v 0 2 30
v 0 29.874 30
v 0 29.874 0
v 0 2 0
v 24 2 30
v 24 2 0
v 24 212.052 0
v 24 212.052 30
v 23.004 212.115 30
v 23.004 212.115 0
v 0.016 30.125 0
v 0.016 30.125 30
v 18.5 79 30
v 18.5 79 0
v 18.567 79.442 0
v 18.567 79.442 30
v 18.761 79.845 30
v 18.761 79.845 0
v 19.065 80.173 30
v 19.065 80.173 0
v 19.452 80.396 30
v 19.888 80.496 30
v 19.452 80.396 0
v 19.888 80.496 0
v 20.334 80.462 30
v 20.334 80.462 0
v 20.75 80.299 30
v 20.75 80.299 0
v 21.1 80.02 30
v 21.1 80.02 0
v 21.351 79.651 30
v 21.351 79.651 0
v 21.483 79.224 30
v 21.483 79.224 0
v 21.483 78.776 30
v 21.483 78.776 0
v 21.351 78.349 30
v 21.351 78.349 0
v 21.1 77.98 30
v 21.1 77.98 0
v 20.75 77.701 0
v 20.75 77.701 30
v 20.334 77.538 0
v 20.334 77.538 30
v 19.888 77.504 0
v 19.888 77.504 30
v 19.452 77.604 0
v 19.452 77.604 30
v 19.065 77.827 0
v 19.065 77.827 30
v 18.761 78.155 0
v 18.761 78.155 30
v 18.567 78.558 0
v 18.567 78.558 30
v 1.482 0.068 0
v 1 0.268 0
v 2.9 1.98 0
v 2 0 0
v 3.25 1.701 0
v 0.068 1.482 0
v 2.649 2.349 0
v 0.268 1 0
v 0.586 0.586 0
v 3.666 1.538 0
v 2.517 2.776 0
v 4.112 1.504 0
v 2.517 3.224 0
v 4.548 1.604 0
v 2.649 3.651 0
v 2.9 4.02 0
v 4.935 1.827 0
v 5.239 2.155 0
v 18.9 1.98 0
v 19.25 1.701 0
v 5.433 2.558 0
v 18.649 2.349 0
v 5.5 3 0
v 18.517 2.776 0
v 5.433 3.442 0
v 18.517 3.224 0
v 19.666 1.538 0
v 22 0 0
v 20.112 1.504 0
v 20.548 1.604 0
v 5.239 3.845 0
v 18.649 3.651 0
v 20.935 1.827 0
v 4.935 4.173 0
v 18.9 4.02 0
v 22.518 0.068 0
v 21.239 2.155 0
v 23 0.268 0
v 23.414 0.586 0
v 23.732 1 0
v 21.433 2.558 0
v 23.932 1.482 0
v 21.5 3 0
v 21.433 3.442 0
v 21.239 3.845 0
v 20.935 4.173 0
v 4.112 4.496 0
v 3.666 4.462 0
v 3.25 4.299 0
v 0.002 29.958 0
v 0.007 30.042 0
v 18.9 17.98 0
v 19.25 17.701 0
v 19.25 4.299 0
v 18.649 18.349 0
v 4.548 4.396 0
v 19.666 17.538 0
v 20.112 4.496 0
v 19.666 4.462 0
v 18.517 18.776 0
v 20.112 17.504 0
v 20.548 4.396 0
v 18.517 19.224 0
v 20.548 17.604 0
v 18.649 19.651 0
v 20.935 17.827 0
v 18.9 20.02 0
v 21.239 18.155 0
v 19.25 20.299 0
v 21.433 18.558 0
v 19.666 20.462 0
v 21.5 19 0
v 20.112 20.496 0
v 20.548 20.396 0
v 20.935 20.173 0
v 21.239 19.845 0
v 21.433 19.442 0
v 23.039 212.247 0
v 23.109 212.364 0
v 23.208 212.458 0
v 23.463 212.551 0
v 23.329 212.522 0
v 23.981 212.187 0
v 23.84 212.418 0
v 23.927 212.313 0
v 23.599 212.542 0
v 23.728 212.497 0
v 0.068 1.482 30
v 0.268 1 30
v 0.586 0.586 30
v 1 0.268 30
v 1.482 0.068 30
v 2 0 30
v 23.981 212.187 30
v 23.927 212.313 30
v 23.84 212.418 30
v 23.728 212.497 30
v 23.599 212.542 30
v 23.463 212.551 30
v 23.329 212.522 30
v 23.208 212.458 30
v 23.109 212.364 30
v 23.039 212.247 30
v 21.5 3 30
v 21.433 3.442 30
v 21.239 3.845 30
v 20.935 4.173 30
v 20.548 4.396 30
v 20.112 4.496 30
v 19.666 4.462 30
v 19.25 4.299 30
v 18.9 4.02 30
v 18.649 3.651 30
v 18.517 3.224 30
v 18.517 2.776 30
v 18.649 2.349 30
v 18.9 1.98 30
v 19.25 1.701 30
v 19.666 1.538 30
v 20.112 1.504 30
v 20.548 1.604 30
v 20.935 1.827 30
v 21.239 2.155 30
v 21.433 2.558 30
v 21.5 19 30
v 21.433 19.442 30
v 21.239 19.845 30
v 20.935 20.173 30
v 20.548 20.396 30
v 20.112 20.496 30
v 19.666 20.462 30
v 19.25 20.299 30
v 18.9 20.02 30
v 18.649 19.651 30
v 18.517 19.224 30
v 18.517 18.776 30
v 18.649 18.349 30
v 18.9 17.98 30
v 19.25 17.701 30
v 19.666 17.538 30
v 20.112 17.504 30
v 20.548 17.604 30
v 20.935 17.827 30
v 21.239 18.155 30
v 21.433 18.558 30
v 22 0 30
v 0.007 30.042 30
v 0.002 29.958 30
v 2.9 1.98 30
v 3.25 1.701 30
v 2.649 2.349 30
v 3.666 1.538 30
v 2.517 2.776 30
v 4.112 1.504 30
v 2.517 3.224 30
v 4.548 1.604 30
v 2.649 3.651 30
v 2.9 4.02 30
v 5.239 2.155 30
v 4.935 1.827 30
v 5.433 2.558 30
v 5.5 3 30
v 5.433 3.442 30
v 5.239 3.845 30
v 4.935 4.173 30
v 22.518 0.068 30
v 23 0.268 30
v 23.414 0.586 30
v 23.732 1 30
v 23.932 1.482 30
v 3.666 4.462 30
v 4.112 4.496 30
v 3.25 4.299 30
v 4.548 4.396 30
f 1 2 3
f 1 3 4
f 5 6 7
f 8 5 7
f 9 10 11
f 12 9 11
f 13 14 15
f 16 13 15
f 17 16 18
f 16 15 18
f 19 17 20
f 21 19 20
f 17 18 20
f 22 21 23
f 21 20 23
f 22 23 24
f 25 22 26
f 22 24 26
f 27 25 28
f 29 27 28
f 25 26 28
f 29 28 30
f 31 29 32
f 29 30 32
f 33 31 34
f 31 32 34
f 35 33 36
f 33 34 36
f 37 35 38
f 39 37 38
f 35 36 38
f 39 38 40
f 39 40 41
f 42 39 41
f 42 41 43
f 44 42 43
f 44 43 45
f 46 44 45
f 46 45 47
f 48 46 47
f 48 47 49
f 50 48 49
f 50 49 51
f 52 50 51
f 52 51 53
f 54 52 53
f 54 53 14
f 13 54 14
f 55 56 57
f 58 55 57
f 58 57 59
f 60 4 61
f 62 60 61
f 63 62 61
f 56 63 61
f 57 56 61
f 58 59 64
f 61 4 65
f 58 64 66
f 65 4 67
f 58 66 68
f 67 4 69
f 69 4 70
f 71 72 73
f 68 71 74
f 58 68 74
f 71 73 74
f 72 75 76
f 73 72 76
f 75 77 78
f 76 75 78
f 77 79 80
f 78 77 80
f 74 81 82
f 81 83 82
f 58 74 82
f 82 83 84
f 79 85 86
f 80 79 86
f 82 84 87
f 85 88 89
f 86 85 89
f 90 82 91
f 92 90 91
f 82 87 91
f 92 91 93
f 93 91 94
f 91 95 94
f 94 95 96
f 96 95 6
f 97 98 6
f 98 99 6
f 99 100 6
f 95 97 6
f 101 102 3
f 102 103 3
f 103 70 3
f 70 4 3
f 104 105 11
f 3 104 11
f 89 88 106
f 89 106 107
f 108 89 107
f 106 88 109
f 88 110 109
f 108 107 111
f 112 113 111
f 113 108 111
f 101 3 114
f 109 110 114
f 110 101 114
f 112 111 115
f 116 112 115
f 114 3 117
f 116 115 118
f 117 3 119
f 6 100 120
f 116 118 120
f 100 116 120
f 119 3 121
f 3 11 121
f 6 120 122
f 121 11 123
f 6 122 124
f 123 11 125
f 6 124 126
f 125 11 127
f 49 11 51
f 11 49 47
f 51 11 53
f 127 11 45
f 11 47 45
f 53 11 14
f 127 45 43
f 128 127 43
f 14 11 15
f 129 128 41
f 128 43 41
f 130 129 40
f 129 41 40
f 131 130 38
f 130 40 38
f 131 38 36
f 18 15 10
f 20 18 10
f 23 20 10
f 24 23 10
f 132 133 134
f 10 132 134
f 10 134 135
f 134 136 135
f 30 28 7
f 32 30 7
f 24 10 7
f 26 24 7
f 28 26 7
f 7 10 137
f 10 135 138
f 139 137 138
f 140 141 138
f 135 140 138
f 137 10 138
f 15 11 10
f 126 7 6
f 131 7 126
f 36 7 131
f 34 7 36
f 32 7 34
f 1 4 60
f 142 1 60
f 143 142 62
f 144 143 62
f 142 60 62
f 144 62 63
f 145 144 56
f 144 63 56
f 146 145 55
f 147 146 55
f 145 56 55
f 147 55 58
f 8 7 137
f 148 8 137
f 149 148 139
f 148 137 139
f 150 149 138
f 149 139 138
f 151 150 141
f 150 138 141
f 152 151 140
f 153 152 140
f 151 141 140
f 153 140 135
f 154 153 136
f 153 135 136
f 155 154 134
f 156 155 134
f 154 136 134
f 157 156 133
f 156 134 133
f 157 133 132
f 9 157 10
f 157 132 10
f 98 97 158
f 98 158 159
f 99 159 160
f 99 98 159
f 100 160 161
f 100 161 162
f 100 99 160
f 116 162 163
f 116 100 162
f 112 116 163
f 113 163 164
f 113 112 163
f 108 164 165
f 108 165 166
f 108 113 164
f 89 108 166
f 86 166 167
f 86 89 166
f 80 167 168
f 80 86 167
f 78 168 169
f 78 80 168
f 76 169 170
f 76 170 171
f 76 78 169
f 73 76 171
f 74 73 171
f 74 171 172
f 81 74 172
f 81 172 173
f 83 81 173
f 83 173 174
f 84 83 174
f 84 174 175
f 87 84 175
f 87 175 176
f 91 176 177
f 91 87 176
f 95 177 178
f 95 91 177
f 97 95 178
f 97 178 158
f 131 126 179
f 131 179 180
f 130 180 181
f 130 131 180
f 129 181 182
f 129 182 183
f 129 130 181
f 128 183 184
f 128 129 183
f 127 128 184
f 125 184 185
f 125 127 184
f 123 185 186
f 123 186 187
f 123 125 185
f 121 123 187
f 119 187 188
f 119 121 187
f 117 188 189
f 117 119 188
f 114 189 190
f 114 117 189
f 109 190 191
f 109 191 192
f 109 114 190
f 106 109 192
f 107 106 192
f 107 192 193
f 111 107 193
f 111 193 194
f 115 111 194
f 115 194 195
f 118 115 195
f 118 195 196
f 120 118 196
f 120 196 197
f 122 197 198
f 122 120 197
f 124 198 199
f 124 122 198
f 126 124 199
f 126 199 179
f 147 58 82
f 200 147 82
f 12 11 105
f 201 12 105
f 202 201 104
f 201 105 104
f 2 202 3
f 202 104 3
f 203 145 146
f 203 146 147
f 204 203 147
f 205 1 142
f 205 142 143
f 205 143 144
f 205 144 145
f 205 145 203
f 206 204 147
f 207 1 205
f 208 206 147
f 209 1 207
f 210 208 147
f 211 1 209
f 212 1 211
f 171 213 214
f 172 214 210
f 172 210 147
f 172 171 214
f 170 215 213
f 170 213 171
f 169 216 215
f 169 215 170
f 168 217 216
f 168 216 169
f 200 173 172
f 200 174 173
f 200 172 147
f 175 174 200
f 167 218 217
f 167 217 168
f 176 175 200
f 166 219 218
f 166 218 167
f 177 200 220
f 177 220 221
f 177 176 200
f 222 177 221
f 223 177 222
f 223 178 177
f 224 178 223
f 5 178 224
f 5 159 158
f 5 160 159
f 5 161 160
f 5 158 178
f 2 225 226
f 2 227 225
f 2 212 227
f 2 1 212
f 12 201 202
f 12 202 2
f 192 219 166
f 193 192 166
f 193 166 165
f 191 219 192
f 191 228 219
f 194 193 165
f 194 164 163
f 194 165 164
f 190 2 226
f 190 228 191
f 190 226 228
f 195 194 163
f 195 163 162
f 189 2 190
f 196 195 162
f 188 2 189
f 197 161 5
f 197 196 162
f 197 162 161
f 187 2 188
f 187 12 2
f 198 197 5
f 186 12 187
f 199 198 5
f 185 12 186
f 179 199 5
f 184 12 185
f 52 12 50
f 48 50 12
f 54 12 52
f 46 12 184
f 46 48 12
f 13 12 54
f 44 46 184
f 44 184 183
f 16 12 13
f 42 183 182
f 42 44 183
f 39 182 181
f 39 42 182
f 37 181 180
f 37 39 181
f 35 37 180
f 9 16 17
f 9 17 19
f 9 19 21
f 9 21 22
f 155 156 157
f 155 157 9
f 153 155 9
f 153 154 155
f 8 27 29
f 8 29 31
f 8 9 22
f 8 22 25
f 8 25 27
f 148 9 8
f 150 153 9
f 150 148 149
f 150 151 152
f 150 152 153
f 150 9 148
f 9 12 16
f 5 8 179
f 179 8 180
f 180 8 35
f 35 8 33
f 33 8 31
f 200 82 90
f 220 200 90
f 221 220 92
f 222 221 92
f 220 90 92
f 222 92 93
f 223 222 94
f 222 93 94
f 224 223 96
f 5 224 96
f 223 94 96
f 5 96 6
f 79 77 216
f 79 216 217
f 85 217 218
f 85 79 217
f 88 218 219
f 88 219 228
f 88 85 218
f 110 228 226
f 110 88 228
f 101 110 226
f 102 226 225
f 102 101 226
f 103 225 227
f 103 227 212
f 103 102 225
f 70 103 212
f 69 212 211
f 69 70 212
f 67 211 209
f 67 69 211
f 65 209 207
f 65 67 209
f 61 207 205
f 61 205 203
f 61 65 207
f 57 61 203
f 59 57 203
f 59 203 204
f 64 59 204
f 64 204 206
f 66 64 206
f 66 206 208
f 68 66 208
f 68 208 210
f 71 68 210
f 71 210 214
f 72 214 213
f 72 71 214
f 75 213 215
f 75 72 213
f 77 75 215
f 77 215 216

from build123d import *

# Parameters (mm, degrees)
SKETCH_1_R          = 1.5
EXTRUDE_2_DEPTH     = 30
SKETCH_2_R          = 1.5
CUT_EXTRUDE_1_DEPTH = 216.996068062


with BuildPart() as part:
    # 草图1 → 凸台-拉伸2 (new body)
    with BuildSketch(Plane.XY):
        with BuildLine():
            Line((23.003941811, 212.114539339), (0.015767245, 30.124824021))
            ThreePointArc((0.015767245, 30.124824021), (0.003945703, 29.999751784), (0, 29.874184094))
            Line((0, 29.874184094), (0, 2))
            ThreePointArc((0, 2), (0.585786438, 0.585786438), (2, 0))
            Line((2, 0), (22, 0))
            ThreePointArc((22, 0), (23.414213562, 0.585786438), (24, 2))
            Line((24, 2), (24, 212.051879357))
            ThreePointArc((24, 212.051879357), (23.531391922, 212.550892931), (23.003941811, 212.114539339))
        make_face()
        with Locations((20, 3)):
            Circle(SKETCH_1_R, mode=Mode.SUBTRACT)
        with Locations((4, 3)):
            Circle(SKETCH_1_R, mode=Mode.SUBTRACT)
        with Locations((20, 19)):
            Circle(SKETCH_1_R, mode=Mode.SUBTRACT)
    extrude(amount=EXTRUDE_2_DEPTH)

    # 草图2 → 切除-拉伸1 (cut, through all)
    with BuildSketch(Plane(origin=(0, 0, 0), x_dir=(-1, 0, 0), z_dir=(0, 0, -1))):
        with Locations((-20, 79)):
            Circle(SKETCH_2_R)
    extrude(amount=-CUT_EXTRUDE_1_DEPTH, mode=Mode.SUBTRACT)


solid = part.part
